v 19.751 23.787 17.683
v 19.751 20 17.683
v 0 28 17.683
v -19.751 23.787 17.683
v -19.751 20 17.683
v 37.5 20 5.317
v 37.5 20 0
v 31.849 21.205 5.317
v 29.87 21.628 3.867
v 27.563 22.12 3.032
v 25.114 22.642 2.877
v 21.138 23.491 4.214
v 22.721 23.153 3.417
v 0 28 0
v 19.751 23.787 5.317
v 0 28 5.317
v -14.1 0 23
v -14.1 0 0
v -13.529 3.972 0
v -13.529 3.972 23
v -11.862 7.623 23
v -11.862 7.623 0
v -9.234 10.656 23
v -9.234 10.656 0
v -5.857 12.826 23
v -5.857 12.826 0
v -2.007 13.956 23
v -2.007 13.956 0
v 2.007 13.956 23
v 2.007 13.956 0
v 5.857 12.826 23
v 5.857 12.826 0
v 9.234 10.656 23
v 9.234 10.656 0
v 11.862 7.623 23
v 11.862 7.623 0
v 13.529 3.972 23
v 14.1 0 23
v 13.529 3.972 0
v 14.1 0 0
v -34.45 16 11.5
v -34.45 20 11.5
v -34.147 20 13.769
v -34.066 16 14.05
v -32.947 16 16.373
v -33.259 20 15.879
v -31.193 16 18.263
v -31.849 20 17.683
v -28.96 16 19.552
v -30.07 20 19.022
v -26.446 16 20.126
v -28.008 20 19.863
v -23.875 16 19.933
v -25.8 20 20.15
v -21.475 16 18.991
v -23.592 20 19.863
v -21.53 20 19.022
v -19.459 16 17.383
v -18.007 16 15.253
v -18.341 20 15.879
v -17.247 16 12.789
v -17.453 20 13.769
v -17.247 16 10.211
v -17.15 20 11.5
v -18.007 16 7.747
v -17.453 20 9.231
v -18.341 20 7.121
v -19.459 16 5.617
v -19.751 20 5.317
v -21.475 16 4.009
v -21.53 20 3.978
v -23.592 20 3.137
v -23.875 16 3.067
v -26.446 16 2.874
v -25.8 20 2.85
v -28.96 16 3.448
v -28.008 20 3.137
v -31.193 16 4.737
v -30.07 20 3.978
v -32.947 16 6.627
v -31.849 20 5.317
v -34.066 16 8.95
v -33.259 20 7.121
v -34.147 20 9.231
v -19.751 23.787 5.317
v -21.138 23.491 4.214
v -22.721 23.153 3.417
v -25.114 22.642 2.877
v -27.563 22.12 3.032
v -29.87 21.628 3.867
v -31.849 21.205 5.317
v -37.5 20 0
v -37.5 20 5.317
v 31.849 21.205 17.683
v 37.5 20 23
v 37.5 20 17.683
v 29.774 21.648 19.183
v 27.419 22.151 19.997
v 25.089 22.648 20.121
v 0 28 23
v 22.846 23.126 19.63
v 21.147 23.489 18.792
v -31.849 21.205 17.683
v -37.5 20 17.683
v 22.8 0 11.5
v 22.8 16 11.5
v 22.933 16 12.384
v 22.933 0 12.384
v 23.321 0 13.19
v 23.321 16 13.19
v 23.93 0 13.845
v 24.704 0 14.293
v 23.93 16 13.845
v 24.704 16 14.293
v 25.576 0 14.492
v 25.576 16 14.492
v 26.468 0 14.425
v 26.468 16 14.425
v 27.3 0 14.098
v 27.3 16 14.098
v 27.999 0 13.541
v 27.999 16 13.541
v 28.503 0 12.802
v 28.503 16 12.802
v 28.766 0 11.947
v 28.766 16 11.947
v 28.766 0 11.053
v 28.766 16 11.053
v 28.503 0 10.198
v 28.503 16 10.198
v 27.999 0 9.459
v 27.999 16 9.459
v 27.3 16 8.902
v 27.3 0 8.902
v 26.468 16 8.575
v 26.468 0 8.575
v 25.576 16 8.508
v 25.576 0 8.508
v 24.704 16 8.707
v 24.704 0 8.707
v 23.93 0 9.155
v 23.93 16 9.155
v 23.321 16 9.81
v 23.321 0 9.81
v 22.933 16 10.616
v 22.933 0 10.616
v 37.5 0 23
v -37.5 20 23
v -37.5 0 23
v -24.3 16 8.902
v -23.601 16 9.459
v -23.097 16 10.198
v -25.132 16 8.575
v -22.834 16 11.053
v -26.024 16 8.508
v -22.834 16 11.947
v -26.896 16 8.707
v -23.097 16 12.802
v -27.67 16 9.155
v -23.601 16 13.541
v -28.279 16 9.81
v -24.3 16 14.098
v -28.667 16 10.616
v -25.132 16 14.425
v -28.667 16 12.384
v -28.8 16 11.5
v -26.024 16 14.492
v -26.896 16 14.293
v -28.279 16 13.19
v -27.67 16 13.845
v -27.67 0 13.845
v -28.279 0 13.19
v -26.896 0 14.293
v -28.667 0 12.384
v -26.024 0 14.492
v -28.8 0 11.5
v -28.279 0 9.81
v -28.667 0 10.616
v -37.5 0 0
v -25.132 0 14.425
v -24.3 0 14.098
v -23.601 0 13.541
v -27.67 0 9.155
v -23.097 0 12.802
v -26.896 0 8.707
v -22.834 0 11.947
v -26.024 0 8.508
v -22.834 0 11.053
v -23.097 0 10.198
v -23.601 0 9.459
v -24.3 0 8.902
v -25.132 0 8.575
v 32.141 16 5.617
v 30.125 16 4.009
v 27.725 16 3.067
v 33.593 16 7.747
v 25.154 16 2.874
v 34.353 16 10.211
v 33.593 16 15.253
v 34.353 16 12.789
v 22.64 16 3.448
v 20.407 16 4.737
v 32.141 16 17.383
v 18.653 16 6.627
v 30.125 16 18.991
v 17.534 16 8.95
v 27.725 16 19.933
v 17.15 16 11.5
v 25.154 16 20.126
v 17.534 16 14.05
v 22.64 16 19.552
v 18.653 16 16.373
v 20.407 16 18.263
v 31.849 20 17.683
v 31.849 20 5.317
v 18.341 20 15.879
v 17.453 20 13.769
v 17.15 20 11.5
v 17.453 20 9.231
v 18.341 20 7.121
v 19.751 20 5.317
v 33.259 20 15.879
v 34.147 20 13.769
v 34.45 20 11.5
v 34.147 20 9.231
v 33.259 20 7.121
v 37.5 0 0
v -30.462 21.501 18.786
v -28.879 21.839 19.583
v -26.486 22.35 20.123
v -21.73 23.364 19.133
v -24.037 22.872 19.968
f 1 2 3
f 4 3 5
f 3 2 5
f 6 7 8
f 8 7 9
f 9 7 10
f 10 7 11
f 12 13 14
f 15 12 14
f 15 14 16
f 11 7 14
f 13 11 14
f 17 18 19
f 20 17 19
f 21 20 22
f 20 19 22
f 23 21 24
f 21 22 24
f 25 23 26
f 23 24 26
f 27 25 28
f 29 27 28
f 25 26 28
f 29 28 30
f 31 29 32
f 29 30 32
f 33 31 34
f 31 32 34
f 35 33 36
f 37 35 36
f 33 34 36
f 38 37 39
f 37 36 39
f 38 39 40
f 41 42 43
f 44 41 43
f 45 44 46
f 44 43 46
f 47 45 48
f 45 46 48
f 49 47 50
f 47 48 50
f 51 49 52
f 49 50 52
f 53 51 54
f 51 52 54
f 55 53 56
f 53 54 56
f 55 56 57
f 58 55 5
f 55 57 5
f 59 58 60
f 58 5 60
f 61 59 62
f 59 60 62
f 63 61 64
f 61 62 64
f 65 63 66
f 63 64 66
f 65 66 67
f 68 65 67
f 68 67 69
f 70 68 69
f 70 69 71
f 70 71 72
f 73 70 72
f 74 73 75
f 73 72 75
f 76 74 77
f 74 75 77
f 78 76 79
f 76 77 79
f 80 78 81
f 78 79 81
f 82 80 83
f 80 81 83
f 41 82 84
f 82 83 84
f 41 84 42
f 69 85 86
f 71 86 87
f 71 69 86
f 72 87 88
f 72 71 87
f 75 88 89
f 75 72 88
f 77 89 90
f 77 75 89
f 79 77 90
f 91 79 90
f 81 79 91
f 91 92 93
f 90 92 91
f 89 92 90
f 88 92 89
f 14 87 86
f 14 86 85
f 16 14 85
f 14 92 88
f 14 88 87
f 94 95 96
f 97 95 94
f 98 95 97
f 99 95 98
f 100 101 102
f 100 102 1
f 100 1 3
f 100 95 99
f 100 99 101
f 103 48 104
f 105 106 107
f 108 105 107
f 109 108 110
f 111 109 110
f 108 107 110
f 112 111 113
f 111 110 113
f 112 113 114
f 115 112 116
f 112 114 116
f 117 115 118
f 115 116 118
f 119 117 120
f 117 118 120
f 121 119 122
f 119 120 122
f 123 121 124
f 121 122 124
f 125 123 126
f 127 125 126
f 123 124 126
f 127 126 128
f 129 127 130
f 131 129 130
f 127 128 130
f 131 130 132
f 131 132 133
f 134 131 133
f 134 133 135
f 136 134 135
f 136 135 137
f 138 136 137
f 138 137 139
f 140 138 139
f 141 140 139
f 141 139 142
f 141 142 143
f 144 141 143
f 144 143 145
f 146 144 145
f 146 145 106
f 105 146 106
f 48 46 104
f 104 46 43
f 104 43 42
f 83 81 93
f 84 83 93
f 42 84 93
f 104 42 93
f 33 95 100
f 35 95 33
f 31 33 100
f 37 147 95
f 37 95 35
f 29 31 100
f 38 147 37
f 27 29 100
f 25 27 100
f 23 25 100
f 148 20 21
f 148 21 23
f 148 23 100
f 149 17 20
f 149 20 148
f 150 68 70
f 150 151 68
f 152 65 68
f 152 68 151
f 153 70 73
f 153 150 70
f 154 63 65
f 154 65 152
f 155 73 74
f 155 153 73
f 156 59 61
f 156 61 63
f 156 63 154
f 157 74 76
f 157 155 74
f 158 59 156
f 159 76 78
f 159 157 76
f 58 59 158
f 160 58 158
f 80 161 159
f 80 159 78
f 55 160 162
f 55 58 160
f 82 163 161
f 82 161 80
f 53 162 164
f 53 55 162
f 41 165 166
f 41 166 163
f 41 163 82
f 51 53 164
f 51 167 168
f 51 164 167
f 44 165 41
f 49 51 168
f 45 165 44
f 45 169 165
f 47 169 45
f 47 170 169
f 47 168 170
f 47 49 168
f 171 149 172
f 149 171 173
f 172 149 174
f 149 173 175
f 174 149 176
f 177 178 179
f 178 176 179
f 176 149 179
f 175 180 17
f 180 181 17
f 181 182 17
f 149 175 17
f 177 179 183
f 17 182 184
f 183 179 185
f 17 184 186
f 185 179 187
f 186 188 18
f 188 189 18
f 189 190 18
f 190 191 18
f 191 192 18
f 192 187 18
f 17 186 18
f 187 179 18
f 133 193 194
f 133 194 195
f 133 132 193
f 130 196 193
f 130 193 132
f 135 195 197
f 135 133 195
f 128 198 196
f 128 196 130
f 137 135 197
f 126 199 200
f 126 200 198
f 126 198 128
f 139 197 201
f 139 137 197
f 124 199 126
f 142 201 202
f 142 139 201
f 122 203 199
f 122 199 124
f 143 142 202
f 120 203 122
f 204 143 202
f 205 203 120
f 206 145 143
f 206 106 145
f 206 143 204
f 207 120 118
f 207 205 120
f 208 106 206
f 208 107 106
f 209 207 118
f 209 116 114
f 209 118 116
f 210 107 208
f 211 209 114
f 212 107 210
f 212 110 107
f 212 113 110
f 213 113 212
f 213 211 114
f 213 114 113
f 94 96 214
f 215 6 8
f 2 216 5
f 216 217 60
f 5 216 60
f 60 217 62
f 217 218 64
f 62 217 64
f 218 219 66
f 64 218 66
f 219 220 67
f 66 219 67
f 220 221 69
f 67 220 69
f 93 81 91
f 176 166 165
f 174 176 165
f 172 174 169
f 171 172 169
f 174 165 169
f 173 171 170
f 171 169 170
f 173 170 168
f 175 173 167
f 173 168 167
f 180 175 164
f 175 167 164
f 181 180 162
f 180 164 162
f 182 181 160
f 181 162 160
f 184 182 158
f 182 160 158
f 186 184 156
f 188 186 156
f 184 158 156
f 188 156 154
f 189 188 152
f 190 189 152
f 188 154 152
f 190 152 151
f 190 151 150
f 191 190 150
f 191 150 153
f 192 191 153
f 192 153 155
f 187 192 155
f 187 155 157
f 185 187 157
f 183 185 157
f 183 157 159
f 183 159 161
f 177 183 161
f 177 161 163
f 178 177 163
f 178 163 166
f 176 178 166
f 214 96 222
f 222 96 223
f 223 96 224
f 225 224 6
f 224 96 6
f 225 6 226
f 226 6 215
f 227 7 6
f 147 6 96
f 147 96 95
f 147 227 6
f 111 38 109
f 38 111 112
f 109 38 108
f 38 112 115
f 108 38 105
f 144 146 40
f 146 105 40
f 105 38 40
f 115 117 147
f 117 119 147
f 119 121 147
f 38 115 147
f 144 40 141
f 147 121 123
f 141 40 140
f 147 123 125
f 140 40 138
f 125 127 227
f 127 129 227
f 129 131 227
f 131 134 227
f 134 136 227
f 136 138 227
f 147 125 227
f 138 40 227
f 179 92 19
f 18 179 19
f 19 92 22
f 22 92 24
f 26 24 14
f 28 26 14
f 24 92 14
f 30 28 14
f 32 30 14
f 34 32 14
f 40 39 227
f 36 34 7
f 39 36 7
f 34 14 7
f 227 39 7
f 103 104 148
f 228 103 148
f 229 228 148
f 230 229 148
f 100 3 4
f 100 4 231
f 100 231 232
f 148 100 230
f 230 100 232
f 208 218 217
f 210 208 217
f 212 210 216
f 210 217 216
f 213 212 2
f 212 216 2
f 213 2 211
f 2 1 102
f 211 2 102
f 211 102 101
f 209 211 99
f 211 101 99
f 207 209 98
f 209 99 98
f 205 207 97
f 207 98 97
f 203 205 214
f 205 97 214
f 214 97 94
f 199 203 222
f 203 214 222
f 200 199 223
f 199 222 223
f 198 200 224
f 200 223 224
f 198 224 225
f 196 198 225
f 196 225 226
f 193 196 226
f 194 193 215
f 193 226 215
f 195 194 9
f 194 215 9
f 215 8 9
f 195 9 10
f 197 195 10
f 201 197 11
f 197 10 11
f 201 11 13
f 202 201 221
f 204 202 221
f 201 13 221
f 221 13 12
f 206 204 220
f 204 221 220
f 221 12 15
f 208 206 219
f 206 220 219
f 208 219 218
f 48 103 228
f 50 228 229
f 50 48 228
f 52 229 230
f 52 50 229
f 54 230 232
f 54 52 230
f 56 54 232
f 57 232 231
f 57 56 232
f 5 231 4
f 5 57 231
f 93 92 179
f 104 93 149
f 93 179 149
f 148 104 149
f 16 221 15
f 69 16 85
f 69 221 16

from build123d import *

# Parameters (mm, degrees)
F1_DEPTH  = 23
F4_D      = 6
F5_D      = 6
F6_W      = 75
F6_H      = 5.3172297776
F7_DEPTH  = 8
F8_SIZE2  = 37.5
F8_SIZE   = 8
F9_SIZE2  = 37.5
F9_SIZE   = 8
F10_SIZE2 = 37.49999
F10_SIZE  = 7.99999
F11_SIZE2 = 37.49999
F11_SIZE  = 7.99999
F12_R     = 8.65
F13_DEPTH = 4


# Not quite as in the source:
# - a fillet or chamfer is up to 0.001 mm smaller than in the source, because OpenCascade refuses the exact size


with BuildPart() as f1:
    # F0 (on Top) → F1 (new body)
    with BuildSketch(Plane.XY):
        with BuildLine():
            Line((37.5, 20), (-37.5, 20))
            Line((-37.5, 20), (-37.5, 0))
            Line((-37.5, 0), (-14.1, 0))
            ThreePointArc((-14.1, 0), (0, 14.1), (14.1, 0))
            Line((14.1, 0), (37.5, 0))
            Line((37.5, 0), (37.5, 20))
        make_face()
    extrude(amount=F1_DEPTH)

    # F4 (through all)
    with Locations(Plane.XZ):
        with Locations((-25.8, 11.5)):
            Hole(F4_D / 2)

    # F5 (through all)
    with Locations(Plane.XZ):
        with Locations((25.8, 11.5)):
            Hole(F5_D / 2)

    # F6 (on face) → F7 (join)
    with BuildSketch(Plane(origin=(0, 20, 0), x_dir=(-1, 0, 0), z_dir=(0, 1, 0))):
        with Locations((0, 20.3413851112)):
            Rectangle(F6_W, F6_H)
        with Locations((0, 2.6586148888)):
            Rectangle(F6_W, F6_H)
    extrude(amount=F7_DEPTH)

    # F8
    f8_edges = [f1.edges().sort_by_distance(p)[0] for p in [
        (37.5, 28, 2.658615),
    ]]
    f8_side = f1.faces().sort_by_distance((37.5, 12.185127, 11.5))[0]
    chamfer(f8_edges, length=F8_SIZE, length2=F8_SIZE2, reference=f8_side)

    # F9
    f9_edges = [f1.edges().sort_by_distance(p)[0] for p in [
        (37.5, 28, 20.341385),
    ]]
    f9_side = f1.faces().sort_by_distance((37.5, 11.185045, 12.248388))[0]
    chamfer(f9_edges, length=F9_SIZE, length2=F9_SIZE2, reference=f9_side)

    # F10 (size 8 and 37.5 in the source; OpenCascade refuses exactly that, so slightly less here)
    f10_edges = [f1.edges().sort_by_distance(p)[0] for p in [
        (-37.5, 28, 20.341385),
    ]]
    f10_side = f1.faces().sort_by_distance((-37.5, 12.185127, 11.5))[0]
    chamfer(f10_edges, length=F10_SIZE, length2=F10_SIZE2, reference=f10_side)

    # F11 (size 8 and 37.5 in the source; OpenCascade refuses exactly that, so slightly less here)
    f11_edges = [f1.edges().sort_by_distance(p)[0] for p in [
        (-37.5, 28, 2.658615),
    ]]
    f11_side = f1.faces().sort_by_distance((-37.5, 11.185046, 10.751613))[0]
    chamfer(f11_edges, length=F11_SIZE, length2=F11_SIZE2, reference=f11_side)

    # F12 (on face) → F13 (cut, symmetric)
    with BuildSketch(Plane(origin=(0, 20, 0), x_dir=(-1, 0, 0), z_dir=(0, 1, 0))):
        with Locations((25.8, 11.5)):
            Circle(F12_R)
        with Locations((-25.8, 11.5)):
            Circle(F12_R)
    extrude(amount=F13_DEPTH, both=True, mode=Mode.SUBTRACT)


solid = f1.part
